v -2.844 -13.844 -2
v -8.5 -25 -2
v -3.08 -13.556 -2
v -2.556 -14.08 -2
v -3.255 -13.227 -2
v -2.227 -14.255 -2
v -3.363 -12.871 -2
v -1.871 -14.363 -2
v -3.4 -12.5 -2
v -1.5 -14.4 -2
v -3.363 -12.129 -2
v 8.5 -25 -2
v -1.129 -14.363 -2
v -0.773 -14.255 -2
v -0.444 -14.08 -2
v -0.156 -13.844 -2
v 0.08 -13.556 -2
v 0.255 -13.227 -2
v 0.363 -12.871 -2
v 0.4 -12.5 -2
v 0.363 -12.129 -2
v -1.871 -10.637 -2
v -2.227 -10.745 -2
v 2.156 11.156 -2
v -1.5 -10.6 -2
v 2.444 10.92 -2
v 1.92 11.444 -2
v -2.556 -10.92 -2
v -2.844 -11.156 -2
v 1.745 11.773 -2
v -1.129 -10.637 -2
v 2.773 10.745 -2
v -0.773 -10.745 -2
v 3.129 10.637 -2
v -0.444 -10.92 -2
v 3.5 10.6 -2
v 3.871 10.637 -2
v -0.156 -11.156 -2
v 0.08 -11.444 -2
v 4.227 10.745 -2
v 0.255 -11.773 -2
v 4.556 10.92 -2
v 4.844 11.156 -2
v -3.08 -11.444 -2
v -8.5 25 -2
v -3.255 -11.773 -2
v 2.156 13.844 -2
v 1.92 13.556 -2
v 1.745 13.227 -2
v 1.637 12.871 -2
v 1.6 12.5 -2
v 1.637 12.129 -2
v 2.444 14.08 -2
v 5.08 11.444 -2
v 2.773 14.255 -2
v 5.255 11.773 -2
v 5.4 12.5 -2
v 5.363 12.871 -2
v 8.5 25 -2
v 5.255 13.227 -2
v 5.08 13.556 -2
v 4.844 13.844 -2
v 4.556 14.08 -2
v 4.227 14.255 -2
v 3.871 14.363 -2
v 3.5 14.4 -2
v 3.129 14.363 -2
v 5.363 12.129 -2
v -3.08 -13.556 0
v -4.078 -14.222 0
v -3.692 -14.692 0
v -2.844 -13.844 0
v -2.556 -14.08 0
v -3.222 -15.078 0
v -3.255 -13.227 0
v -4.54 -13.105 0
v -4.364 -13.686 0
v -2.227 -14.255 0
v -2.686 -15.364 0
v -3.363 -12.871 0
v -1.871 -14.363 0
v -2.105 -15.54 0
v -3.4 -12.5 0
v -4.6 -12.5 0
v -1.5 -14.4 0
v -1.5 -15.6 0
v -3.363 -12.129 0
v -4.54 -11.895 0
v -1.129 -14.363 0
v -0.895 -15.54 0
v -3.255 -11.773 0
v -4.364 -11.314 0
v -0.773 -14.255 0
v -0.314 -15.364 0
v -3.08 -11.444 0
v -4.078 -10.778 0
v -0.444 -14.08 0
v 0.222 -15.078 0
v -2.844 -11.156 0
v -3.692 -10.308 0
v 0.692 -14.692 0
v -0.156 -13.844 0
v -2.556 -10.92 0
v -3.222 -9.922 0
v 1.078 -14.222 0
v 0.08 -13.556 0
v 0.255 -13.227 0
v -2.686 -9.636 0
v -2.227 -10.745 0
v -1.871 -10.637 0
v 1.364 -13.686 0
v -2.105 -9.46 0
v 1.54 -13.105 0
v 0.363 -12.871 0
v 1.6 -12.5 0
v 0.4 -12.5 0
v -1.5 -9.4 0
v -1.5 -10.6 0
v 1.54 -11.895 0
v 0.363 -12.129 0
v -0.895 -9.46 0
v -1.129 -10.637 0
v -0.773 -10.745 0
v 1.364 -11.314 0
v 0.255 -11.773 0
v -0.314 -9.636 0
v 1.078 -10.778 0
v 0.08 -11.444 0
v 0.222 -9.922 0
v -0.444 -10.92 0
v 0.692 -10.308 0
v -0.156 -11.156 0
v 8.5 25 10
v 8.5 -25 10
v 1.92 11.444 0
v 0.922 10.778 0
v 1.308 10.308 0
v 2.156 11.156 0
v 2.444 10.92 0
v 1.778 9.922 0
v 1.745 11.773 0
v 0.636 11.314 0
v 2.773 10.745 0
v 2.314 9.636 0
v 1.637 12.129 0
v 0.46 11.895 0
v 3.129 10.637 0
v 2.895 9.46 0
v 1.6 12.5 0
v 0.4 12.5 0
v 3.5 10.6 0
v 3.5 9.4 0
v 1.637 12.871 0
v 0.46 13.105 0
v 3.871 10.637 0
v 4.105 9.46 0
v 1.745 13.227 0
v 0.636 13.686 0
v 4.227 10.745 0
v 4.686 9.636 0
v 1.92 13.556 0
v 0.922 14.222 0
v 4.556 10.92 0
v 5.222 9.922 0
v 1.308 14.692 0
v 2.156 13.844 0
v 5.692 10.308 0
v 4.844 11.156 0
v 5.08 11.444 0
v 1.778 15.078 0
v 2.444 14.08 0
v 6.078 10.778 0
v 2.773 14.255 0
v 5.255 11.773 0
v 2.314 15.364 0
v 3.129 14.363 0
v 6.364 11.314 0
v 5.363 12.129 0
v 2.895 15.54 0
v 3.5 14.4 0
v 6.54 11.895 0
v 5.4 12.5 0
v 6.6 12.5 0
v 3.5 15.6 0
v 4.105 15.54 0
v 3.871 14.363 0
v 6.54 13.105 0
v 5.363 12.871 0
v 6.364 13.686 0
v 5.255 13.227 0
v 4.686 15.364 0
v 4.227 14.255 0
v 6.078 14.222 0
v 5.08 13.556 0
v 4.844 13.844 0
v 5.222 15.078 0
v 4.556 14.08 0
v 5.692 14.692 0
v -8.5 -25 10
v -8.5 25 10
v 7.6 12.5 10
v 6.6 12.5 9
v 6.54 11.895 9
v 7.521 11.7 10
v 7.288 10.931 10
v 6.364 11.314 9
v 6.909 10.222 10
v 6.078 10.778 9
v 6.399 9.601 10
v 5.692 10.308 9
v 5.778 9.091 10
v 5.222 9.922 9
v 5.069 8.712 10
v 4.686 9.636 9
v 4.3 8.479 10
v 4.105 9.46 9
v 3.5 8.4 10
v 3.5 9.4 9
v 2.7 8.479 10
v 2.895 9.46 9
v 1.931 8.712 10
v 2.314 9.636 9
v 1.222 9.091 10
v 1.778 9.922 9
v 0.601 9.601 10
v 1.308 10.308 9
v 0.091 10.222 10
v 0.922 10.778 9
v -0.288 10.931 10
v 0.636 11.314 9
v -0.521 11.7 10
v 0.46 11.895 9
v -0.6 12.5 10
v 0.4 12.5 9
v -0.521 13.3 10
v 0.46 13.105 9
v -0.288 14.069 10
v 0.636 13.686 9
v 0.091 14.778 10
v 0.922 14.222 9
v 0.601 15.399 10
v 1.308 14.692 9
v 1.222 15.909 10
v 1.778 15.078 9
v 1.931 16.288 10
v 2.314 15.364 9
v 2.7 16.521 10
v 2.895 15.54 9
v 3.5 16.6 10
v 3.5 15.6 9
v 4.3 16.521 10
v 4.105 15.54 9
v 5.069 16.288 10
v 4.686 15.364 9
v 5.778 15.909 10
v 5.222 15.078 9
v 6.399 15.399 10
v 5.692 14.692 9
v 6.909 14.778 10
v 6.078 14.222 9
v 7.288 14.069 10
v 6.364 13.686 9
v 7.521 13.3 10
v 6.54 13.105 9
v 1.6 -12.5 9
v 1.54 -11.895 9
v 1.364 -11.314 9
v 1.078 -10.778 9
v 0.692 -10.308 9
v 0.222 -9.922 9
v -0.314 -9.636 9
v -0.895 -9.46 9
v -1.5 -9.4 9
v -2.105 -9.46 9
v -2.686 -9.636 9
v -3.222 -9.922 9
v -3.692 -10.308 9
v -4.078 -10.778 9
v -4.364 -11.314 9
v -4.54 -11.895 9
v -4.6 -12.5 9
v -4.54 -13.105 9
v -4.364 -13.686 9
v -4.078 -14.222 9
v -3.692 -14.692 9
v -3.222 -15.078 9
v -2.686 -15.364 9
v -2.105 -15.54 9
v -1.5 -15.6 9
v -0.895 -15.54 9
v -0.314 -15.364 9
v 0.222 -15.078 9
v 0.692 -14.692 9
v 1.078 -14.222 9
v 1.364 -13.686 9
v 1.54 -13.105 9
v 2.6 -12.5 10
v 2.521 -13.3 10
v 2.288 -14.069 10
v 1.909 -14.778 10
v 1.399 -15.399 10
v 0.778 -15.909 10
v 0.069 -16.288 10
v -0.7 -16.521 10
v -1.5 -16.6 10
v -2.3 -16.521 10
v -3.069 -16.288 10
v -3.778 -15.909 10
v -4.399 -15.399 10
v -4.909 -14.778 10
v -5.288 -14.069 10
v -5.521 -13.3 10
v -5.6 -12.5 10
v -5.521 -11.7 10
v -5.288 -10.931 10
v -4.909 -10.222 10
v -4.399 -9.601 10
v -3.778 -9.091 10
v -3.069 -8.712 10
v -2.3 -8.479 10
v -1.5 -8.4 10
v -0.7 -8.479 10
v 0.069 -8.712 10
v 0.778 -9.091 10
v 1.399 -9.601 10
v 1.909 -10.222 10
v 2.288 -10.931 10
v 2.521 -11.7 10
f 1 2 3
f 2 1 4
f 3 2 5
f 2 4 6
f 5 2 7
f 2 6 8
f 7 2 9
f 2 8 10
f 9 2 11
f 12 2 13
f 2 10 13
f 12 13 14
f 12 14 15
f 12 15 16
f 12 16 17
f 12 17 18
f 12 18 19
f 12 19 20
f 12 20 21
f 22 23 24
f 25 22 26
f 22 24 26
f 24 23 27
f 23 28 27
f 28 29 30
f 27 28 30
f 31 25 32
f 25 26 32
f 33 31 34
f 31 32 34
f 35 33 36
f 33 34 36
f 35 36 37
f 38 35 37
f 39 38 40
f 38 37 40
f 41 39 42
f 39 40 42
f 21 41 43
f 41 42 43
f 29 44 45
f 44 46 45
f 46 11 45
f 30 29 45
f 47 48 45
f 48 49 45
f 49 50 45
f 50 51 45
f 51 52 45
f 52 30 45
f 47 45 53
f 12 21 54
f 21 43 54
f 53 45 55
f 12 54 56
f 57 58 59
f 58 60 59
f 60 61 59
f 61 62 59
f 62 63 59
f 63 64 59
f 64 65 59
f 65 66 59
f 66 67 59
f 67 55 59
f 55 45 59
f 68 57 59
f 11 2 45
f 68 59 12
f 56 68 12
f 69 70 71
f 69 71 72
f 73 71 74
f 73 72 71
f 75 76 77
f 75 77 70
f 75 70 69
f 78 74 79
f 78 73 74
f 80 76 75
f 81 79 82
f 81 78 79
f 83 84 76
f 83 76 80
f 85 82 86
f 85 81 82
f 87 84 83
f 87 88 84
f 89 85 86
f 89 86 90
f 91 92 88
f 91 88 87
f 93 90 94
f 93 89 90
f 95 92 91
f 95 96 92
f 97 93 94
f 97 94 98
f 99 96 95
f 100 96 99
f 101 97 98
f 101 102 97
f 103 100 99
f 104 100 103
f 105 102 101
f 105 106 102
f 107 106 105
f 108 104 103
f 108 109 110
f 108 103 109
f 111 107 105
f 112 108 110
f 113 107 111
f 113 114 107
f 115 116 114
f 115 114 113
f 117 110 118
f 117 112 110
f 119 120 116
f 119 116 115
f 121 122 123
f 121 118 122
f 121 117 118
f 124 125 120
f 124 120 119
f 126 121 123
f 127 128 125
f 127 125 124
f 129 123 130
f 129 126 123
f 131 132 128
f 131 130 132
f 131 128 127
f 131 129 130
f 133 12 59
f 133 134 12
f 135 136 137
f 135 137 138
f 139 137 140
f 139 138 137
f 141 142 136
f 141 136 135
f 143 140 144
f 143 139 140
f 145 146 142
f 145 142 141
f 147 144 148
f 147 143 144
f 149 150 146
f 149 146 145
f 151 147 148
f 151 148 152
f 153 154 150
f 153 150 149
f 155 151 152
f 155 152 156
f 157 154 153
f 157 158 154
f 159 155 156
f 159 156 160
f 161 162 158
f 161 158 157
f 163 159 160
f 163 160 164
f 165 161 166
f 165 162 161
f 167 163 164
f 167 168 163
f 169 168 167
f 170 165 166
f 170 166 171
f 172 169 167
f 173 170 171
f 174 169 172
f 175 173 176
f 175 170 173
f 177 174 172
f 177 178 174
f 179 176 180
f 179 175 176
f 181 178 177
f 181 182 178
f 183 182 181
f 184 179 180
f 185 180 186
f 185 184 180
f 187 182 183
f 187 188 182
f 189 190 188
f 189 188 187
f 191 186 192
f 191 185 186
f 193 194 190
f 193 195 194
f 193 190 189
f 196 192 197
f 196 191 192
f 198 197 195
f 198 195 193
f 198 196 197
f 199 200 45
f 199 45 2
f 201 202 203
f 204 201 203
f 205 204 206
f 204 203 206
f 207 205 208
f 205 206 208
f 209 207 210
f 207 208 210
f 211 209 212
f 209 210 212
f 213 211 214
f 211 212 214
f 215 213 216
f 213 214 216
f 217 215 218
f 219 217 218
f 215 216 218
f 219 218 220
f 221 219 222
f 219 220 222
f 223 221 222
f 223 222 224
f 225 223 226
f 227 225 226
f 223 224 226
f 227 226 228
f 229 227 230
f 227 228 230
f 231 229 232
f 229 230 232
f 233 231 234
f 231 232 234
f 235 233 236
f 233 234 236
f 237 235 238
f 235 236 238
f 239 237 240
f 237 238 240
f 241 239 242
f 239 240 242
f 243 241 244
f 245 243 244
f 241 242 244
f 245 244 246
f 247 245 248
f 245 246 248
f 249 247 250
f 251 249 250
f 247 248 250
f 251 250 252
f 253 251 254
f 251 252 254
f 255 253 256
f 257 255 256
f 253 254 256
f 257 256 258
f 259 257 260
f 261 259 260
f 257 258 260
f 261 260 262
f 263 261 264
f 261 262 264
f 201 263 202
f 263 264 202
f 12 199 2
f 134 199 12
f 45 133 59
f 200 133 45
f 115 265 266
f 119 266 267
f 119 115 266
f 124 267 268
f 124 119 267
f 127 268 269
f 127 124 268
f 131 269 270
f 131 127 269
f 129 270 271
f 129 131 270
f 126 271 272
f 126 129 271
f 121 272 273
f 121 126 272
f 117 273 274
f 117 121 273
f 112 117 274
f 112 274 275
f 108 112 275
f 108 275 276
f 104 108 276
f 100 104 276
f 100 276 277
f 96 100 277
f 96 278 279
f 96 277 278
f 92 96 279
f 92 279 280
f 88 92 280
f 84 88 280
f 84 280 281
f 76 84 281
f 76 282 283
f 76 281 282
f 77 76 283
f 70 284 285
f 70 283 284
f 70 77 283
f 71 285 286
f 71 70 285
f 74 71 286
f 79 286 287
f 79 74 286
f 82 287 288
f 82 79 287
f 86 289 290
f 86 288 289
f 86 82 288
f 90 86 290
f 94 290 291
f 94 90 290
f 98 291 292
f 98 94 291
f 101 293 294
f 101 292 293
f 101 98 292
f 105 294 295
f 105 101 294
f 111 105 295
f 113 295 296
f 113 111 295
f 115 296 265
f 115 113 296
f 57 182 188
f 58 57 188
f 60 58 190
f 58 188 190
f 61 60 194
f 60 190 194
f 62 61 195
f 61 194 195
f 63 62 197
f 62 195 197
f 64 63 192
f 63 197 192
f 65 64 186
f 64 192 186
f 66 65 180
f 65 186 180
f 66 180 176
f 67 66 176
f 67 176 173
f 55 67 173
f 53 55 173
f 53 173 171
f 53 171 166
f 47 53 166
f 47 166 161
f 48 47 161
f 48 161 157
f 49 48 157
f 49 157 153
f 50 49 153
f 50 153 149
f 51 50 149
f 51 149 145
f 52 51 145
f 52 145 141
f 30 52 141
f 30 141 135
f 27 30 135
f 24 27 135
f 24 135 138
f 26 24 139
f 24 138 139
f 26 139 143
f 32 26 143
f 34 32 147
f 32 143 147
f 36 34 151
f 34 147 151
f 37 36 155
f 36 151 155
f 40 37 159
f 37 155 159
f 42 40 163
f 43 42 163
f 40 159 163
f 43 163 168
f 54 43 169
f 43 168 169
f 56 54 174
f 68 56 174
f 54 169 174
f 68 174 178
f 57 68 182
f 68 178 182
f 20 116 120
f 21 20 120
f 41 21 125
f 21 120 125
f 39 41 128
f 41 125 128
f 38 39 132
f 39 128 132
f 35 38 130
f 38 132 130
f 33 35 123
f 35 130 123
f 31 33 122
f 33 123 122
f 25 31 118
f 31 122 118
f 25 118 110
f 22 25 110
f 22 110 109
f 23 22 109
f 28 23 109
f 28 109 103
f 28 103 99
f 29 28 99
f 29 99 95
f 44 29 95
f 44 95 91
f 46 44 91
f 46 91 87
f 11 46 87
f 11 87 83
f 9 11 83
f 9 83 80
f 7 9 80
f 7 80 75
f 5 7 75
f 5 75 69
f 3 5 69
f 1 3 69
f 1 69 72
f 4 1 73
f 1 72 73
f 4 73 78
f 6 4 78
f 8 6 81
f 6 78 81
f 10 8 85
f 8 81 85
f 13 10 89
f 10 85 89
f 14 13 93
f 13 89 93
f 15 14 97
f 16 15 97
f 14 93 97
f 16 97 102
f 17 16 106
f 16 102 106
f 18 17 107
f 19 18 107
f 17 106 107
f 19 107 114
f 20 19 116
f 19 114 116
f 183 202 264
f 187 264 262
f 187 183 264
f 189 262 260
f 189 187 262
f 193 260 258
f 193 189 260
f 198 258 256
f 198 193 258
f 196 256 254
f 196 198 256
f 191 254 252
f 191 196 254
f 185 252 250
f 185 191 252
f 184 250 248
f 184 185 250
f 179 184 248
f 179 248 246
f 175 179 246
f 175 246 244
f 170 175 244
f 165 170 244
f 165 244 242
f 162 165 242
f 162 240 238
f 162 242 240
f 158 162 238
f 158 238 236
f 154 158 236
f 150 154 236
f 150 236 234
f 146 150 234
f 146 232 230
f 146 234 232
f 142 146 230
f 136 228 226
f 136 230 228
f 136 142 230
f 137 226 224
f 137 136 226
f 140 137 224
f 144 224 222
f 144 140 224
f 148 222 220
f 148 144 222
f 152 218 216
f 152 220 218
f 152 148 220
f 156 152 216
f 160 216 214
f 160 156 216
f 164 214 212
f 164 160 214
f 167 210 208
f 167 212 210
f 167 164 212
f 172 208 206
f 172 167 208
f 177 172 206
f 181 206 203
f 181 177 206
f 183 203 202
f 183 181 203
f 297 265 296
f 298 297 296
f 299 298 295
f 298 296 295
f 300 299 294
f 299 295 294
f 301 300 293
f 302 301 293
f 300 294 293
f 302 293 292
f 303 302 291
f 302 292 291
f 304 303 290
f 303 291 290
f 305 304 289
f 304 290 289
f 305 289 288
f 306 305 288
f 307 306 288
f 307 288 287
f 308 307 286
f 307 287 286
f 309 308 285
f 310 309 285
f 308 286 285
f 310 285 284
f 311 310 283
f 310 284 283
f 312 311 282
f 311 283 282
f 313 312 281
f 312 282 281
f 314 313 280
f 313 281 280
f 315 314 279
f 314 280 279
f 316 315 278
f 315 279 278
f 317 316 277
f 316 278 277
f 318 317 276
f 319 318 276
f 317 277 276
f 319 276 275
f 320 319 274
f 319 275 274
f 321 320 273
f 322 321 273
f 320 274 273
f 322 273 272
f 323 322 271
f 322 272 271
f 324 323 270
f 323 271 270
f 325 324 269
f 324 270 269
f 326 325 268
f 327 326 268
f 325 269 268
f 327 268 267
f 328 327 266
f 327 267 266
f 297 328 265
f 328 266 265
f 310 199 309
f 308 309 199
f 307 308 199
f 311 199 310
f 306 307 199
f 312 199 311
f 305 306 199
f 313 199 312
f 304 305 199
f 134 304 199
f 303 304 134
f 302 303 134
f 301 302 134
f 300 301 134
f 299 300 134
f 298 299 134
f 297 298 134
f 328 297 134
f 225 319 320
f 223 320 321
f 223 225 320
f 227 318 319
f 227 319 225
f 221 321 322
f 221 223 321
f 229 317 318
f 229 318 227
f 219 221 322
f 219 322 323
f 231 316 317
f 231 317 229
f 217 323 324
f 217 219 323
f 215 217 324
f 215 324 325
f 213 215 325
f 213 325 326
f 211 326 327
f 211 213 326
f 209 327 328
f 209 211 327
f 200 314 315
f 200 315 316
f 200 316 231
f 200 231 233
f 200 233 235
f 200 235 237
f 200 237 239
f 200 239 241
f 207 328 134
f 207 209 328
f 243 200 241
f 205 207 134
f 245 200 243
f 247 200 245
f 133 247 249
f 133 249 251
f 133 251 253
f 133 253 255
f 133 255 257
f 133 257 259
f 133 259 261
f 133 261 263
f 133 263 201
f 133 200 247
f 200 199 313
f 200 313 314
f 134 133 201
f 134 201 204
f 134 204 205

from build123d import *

# Parameters (mm, degrees)
F1_DEPTH      = 10
F1_DEPTH_BACK = 2
F3_R          = 1.9
F4_DEPTH      = 25
F2_R          = 3.1
F5_DEPTH      = 25
F6_SIZE       = 1


with BuildPart() as f1:
    # F0 (on Top) → F1 (new body, two sides)
    with BuildSketch(Plane.XY) as f1_sk:
        Polygon((8.5, 25), (0, 25), (-8.5, 25), (-8.5, 0), (-8.5, -25), (0, -25), (8.5, -25), (8.5, 0), align=None)
    extrude(amount=F1_DEPTH)
    extrude(f1_sk.sketch, amount=-F1_DEPTH_BACK)

    # F3 (on Top) → F4 (cut)
    with BuildSketch(Plane.XY):
        with Locations((3.5, 12.5)):
            Circle(F3_R)
        with Locations((-1.5, -12.5)):
            Circle(F3_R)
    extrude(amount=-F4_DEPTH, mode=Mode.SUBTRACT)

    # F2 (on Top) → F5 (cut)
    with BuildSketch(Plane.XY):
        with Locations((3.5, 12.5)):
            Circle(F2_R)
        with Locations((-1.5, -12.5)):
            Circle(F2_R)
    extrude(amount=F5_DEPTH, mode=Mode.SUBTRACT)

    # F6
    f6_edges = [f1.edges().sort_by_distance(p)[0] for p in [
        (-4.6, -12.5, 10),
        (0.4, 12.5, 10),
    ]]
    chamfer(f6_edges, length=F6_SIZE)


solid = f1.part
